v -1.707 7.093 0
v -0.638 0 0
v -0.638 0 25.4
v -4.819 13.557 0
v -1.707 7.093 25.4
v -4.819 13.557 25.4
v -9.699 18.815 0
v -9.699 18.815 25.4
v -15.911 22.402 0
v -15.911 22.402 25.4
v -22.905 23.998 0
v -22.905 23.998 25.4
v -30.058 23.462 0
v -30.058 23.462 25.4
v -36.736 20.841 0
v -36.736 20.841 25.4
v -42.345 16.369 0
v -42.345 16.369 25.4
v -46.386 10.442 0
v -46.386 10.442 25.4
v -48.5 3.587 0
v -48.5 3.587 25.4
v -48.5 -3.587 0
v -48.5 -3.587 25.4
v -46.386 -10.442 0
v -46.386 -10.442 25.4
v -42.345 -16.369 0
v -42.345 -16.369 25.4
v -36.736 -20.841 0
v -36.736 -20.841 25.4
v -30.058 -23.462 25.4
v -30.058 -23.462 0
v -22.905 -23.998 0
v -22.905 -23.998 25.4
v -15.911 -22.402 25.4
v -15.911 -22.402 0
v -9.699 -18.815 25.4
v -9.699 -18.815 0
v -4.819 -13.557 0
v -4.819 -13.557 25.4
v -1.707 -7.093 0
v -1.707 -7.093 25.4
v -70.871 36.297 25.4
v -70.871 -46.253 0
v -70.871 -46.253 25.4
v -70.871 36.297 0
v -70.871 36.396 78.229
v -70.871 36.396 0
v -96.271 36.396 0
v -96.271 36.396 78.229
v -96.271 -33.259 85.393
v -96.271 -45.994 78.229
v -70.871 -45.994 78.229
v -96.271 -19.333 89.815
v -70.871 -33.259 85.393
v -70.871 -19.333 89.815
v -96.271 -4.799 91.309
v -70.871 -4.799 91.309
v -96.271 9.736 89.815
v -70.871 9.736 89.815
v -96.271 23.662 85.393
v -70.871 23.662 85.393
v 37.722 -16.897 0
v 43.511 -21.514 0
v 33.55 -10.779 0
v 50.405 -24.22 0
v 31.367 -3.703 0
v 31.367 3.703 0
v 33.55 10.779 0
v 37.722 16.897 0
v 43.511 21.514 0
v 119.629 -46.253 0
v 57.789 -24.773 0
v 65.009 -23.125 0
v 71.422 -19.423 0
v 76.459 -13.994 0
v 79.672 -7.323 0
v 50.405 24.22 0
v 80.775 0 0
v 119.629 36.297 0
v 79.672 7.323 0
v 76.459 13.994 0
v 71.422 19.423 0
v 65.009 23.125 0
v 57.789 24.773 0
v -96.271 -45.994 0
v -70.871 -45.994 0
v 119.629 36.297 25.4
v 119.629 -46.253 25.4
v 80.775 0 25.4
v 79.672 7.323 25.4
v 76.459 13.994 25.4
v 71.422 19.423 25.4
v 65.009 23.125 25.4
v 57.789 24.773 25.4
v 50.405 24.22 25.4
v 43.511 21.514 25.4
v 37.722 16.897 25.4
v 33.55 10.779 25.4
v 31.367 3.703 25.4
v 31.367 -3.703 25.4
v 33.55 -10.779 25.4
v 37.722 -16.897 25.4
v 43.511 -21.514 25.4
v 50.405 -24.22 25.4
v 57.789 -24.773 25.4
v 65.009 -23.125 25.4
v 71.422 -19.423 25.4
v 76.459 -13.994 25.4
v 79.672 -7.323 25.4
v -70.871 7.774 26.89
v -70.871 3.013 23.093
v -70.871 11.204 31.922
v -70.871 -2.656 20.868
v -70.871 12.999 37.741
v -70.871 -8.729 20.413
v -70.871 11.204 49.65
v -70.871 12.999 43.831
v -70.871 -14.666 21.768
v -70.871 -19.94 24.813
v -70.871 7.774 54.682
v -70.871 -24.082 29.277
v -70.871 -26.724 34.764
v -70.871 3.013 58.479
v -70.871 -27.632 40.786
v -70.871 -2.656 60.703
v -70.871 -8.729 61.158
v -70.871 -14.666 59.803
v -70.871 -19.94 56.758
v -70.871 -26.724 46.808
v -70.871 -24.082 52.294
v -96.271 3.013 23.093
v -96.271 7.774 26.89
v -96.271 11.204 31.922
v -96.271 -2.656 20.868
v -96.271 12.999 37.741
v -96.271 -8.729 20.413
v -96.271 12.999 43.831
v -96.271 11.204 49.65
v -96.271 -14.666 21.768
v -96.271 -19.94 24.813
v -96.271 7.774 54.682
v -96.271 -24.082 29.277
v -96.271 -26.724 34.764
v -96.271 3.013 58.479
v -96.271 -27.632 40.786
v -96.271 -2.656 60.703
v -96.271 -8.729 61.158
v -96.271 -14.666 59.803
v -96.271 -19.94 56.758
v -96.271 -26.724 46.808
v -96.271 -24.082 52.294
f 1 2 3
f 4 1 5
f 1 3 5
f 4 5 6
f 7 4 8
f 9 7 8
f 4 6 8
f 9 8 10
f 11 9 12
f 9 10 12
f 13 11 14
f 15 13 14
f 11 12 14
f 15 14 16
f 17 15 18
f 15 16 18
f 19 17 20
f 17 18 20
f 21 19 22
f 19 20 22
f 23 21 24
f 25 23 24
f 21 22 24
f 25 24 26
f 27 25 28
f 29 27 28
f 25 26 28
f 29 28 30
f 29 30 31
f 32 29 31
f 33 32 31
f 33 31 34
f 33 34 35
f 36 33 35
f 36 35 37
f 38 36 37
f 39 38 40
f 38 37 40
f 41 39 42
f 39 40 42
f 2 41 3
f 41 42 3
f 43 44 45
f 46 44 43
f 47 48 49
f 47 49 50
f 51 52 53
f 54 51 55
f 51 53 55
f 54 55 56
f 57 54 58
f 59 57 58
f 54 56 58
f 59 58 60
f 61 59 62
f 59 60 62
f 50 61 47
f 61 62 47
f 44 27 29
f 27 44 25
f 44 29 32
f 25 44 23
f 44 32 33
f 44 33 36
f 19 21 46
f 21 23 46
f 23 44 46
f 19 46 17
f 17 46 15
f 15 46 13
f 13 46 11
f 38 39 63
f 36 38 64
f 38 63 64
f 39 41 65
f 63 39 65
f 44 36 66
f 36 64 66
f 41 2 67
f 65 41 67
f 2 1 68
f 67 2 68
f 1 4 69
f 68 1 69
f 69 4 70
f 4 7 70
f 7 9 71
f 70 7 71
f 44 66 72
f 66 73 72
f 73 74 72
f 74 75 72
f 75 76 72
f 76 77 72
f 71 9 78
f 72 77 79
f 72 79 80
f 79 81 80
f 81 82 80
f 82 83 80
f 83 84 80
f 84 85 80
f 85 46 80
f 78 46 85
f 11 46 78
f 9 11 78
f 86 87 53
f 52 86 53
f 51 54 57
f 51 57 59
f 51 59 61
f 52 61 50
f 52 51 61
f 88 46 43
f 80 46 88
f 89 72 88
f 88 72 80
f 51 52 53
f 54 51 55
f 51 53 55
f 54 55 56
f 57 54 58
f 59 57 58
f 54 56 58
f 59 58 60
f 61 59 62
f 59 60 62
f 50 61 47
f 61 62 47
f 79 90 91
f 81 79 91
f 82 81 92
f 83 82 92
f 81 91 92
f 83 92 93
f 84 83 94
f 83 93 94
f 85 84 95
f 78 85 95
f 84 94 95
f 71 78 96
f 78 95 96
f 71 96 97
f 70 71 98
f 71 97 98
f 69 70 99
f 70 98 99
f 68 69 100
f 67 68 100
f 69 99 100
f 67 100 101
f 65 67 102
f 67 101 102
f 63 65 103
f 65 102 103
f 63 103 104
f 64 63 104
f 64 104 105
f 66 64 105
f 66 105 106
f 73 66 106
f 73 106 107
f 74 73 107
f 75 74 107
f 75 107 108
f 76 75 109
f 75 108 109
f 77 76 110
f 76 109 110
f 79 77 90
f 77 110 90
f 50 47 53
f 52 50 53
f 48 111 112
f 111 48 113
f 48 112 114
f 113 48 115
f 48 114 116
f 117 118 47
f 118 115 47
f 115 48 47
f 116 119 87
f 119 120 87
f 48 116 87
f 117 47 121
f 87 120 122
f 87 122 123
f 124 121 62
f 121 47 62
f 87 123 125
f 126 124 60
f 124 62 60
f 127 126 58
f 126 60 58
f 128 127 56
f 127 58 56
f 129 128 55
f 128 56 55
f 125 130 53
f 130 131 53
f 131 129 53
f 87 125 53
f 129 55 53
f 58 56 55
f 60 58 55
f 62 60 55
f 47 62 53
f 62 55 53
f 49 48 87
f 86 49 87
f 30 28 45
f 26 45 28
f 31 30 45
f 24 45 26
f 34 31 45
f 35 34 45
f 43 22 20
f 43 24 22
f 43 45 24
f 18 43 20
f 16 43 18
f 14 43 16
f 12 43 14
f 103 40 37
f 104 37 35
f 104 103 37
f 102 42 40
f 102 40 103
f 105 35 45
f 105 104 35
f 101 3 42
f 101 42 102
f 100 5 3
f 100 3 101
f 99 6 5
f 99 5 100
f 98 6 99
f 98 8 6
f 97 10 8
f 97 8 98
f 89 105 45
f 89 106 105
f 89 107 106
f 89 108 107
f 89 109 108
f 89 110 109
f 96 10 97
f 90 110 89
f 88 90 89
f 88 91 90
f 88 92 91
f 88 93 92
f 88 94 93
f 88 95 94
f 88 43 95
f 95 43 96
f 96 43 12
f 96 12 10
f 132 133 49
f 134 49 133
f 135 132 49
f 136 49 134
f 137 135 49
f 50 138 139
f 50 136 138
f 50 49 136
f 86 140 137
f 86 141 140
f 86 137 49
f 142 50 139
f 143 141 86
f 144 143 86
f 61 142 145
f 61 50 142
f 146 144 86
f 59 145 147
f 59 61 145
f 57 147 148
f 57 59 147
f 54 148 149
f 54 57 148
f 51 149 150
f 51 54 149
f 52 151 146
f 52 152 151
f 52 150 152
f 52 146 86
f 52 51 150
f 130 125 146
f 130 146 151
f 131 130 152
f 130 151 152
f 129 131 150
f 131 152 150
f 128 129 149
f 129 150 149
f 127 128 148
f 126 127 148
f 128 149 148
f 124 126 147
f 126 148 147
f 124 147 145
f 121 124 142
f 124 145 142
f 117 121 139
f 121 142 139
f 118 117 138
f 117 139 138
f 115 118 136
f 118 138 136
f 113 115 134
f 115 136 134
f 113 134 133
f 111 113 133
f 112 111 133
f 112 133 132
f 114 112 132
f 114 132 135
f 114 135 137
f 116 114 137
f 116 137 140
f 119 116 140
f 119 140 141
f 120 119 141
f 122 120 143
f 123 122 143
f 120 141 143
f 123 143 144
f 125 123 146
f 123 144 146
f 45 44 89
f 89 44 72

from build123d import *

# Parameters (mm, degrees)
F0_W     = 190.5
F0_H     = 82.55
F1_DEPTH = 25.4
F2_R     = 24.065659
F2_R_2   = 24.842685
F3_DEPTH = 25.4
F5_DEPTH = 25.4
F4_W     = 82.389932
F4_H     = 78.229174
F6_DEPTH = 25.4
F7_R     = 20.429763
F8_DEPTH = 25.4


with BuildPart() as f1:
    # F0 (on Top) → F1 (new body)
    with BuildSketch(Plane.XY):
        with Locations((24.379437, -4.978355)):
            Rectangle(F0_W, F0_H)
    extrude(amount=F1_DEPTH)

    # F2 (on face) → F3 (cut)
    with BuildSketch(Plane.XY.offset(25.4)):
        with Locations((-24.703378, 0)):
            Circle(F2_R)
        with Locations((55.932678, 0)):
            Circle(F2_R_2)
    extrude(amount=-F3_DEPTH, mode=Mode.SUBTRACT)


with BuildPart() as f5:
    # F4 (on face) → F5 (new body)
    with BuildSketch(Plane(origin=(-70.870563, 0, 0), x_dir=(0, -1, 0), z_dir=(-1, 0, 0))):
        with BuildLine():
            ThreePointArc((45.9936, 78.229174), (4.798634, 91.309401), (-36.396332, 78.229174))
            Line((-36.396332, 78.229174), (45.9936, 78.229174))
        make_face()
    extrude(amount=F5_DEPTH)


with BuildPart() as f6:
    # F4 (on face) → F6 (new body)
    with BuildSketch(Plane(origin=(-70.870563, 0, 0), x_dir=(0, -1, 0), z_dir=(-1, 0, 0))):
        with Locations((4.798634, 39.114587)):
            Rectangle(F4_W, F4_H)
        with BuildLine():
            ThreePointArc((45.9936, 78.229174), (4.798634, 91.309401), (-36.396332, 78.229174))
            Line((-36.396332, 78.229174), (45.9936, 78.229174))
        make_face()
    extrude(amount=F6_DEPTH)

    # F7 (on face) → F8 (cut)
    with BuildSketch(Plane(origin=(-96.270563, 0, 0), x_dir=(0, -1, 0), z_dir=(-1, 0, 0))):
        with Locations((7.202209, 40.785816)):
            Circle(F7_R)
    extrude(amount=-F8_DEPTH, mode=Mode.SUBTRACT)


solid = Compound([f1.part, f5.part, f6.part])
